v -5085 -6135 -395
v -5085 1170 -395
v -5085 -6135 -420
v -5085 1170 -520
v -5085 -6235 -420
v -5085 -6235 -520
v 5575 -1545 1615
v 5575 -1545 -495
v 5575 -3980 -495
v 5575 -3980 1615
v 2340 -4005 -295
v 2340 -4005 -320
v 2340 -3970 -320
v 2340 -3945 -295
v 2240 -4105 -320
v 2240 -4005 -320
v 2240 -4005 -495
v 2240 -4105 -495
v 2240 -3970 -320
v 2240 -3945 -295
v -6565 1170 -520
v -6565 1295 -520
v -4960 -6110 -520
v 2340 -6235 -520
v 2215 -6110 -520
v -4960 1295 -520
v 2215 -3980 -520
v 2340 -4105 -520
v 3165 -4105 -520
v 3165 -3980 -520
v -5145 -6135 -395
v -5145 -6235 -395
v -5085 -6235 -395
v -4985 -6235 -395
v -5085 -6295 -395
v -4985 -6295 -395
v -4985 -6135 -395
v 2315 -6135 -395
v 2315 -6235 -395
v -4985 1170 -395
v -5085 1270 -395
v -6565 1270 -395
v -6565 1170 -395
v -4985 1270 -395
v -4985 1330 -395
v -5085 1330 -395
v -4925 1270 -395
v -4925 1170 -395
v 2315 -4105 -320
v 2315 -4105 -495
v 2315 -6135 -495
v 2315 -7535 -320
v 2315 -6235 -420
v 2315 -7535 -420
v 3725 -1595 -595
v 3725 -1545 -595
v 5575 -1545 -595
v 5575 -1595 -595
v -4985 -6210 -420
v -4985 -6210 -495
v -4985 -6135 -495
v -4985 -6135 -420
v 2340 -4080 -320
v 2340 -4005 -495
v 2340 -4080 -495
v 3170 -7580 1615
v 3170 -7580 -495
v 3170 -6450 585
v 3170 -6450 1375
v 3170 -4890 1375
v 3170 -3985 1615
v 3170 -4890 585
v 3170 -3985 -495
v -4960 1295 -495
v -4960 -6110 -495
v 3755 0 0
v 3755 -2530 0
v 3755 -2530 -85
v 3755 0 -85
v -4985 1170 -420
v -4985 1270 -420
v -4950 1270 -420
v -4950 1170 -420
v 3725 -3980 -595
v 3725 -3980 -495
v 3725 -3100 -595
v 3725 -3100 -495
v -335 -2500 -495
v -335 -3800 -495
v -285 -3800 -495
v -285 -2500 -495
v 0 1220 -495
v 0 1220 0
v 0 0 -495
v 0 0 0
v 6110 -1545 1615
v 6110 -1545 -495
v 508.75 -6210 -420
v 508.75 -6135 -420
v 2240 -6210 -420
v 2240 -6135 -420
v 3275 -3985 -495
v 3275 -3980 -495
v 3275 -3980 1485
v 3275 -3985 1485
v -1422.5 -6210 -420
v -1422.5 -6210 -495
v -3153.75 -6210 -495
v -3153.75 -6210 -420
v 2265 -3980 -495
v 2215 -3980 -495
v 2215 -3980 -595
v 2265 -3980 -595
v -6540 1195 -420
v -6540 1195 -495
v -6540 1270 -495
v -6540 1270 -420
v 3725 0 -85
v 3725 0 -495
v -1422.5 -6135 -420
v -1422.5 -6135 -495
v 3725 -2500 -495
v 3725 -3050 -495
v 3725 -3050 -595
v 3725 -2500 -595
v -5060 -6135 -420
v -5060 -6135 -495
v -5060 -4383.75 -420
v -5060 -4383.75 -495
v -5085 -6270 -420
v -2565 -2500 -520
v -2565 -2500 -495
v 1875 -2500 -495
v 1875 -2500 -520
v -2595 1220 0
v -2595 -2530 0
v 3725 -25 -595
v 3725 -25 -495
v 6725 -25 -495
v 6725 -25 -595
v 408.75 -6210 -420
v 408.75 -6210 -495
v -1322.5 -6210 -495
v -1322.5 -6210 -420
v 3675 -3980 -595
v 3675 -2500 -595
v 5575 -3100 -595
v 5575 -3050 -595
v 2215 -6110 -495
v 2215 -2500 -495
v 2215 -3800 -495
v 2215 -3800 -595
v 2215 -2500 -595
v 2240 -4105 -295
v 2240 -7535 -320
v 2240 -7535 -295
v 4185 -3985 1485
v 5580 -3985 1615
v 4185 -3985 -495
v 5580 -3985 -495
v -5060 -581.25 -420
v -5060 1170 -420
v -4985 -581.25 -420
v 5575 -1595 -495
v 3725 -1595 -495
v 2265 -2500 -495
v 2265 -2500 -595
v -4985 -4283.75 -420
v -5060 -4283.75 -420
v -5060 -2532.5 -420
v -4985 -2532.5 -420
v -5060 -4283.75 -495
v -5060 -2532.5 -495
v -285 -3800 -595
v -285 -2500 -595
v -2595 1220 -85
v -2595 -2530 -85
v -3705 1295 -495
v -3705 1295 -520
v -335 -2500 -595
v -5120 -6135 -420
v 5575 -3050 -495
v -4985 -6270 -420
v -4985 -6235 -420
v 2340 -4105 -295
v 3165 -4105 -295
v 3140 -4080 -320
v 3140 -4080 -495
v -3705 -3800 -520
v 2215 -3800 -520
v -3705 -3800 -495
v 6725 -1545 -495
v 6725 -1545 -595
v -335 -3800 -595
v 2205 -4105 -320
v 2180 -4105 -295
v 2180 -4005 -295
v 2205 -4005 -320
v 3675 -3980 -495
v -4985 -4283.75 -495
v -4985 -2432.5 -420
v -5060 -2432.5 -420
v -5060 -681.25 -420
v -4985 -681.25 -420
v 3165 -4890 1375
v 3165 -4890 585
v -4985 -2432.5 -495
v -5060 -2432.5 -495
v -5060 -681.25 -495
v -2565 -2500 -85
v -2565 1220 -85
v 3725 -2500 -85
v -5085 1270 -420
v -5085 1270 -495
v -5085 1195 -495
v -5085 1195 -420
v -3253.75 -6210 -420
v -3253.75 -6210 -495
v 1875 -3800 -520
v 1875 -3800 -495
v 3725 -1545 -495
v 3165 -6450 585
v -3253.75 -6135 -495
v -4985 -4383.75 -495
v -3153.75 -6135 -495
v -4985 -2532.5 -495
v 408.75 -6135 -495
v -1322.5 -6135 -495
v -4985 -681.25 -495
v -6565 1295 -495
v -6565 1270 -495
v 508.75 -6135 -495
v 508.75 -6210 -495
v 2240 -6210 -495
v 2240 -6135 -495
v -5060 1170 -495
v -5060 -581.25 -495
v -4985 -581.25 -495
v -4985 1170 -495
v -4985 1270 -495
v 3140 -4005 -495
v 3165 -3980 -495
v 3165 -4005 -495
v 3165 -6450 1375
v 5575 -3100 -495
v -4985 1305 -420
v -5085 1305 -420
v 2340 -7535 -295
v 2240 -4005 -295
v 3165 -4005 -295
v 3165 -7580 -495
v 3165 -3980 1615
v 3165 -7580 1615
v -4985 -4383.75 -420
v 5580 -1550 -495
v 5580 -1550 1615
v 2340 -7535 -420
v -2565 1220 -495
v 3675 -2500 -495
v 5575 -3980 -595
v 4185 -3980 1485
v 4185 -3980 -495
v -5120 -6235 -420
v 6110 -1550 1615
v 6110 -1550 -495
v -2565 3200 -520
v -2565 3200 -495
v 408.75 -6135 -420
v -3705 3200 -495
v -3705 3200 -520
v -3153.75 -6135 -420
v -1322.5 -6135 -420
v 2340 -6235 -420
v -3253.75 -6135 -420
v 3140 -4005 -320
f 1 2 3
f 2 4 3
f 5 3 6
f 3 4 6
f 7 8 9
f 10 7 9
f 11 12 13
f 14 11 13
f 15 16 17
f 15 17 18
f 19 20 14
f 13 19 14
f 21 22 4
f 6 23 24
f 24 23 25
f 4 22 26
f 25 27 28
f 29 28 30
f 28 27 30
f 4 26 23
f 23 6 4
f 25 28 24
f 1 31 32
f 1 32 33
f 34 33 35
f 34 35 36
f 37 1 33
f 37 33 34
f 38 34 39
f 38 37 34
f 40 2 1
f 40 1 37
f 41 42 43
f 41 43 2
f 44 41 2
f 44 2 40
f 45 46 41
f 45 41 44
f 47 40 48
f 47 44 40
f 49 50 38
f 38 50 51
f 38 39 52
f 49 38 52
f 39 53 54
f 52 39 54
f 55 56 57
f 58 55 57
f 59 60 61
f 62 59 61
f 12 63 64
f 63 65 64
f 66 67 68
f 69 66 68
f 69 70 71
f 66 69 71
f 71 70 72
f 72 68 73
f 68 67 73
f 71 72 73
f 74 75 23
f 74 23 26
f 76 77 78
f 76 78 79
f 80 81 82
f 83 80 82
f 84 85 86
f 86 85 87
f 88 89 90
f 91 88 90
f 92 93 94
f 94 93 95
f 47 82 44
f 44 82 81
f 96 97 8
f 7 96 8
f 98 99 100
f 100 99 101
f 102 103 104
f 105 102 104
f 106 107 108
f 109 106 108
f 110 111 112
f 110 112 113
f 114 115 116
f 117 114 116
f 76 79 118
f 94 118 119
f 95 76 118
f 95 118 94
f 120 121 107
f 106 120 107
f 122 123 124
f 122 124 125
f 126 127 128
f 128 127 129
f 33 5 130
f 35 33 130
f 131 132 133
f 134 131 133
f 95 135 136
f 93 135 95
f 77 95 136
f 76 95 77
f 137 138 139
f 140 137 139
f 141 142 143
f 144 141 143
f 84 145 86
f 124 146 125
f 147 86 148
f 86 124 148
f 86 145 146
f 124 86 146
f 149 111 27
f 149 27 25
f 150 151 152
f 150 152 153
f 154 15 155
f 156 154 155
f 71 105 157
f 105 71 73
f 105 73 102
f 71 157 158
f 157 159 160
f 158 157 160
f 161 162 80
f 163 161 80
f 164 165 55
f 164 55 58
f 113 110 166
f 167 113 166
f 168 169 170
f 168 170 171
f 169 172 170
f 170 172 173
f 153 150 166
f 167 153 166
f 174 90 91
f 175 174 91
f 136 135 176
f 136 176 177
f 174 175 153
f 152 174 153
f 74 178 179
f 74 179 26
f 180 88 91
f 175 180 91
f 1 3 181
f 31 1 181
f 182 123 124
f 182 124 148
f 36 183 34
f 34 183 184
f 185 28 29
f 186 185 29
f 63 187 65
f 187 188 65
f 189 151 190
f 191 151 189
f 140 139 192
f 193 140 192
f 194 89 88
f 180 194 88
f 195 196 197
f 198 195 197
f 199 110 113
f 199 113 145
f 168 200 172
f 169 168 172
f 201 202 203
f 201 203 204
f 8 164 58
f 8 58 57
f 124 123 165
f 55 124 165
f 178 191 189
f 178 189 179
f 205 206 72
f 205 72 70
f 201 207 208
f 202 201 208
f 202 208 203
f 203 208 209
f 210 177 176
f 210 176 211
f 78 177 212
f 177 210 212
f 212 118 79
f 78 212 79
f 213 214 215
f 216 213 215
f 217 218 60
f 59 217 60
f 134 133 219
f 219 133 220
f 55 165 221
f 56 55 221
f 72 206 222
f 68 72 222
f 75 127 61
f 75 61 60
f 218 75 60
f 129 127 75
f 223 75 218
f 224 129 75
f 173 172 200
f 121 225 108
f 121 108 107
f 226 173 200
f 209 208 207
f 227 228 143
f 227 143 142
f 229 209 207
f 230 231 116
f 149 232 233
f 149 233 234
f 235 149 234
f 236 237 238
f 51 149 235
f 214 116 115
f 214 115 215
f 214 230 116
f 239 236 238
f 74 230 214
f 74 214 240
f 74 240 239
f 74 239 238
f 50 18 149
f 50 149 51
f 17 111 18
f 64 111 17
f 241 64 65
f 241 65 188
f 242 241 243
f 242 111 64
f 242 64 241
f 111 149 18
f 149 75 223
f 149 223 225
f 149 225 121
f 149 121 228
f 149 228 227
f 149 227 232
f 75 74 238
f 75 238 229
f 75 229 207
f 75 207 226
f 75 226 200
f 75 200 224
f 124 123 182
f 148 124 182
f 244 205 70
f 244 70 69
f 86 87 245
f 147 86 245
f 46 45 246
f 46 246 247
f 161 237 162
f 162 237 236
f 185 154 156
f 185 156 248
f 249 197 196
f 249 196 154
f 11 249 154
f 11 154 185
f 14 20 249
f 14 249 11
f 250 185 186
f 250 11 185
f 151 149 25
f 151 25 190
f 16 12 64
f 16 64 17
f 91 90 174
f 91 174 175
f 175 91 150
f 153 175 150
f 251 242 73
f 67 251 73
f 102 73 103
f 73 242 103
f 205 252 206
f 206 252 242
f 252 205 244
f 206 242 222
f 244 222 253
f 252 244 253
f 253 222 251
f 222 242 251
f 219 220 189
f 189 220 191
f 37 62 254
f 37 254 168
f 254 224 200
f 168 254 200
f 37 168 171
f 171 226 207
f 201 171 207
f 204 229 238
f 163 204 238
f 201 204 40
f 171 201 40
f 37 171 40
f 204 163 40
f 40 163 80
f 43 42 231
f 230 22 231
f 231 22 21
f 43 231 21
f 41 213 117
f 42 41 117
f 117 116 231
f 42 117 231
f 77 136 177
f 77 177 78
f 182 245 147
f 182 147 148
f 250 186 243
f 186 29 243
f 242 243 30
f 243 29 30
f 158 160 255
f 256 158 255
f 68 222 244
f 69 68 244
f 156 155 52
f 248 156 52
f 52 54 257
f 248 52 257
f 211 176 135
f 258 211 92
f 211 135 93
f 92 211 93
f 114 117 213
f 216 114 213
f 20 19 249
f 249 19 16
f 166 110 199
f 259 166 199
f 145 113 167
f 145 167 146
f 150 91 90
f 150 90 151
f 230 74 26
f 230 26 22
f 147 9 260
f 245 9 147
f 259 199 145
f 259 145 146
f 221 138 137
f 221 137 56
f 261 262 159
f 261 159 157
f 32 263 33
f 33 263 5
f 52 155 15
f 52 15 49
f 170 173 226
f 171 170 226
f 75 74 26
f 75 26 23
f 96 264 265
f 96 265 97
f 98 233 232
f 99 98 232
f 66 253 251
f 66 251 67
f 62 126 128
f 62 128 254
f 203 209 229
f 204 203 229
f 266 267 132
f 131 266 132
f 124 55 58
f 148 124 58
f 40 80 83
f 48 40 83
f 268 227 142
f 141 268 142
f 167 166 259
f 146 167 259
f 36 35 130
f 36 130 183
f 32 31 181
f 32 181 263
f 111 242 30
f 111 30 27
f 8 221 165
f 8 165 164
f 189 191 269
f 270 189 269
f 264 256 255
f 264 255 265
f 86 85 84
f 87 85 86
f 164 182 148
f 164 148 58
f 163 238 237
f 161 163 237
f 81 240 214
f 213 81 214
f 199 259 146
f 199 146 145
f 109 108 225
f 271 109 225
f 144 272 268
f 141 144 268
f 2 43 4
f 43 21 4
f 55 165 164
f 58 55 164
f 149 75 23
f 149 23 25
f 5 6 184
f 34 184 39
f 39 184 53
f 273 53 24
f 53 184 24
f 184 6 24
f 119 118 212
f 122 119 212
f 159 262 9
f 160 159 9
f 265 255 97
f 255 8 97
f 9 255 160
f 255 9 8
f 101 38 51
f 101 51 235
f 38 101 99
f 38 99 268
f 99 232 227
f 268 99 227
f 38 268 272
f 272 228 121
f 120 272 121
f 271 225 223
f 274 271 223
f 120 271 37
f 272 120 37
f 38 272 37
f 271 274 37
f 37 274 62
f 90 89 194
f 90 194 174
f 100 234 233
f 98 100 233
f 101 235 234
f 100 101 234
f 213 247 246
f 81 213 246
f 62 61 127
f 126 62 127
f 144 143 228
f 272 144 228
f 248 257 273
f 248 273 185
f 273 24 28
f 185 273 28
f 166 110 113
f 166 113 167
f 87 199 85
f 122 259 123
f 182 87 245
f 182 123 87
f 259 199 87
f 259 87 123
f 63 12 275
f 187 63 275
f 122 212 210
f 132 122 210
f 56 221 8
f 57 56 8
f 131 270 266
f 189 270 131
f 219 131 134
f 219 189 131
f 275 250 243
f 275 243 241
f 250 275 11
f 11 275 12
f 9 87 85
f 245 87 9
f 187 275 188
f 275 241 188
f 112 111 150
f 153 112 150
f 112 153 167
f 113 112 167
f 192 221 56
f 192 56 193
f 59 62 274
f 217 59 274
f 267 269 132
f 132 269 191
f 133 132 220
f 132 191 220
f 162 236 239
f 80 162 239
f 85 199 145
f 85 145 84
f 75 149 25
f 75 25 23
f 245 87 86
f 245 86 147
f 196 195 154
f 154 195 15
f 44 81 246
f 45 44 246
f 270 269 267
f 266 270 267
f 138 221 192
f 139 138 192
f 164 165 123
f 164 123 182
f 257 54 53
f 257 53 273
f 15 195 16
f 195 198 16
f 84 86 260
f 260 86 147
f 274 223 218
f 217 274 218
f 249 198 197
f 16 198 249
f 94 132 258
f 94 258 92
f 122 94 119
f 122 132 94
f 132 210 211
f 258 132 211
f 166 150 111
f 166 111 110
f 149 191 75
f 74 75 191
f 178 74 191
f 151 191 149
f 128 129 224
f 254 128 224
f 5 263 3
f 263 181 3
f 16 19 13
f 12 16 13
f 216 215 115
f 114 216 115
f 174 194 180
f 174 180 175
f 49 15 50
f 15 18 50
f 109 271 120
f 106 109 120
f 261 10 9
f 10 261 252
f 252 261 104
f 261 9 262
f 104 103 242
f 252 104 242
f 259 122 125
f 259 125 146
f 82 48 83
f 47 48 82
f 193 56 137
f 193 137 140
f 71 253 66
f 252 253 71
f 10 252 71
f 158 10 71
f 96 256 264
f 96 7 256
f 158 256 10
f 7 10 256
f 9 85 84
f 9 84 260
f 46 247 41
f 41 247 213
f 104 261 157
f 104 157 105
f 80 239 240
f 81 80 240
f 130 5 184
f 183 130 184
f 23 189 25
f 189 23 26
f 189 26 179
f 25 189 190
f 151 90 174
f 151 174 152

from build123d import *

# Parameters (mm, degrees)
F1_DEPTH  = 85
F3_DEPTH  = 410
F5_DEPTH  = 25
F7_DEPTH  = 25
F9_DEPTH  = 75
F10_W     = 25
F10_H     = 1300
F11_DEPTH = 100
F12_W     = 800
F12_H     = 75
F12_W_2   = 100
F12_H_2   = 60
F12_W_3   = 75
F12_H_3   = 3430
F12_W_4   = 60
F12_H_4   = 100
F13_DEPTH = 25
F15_DEPTH = 25
F16_SIZE  = 24.99999
F18_DEPTH = 25
F20_DEPTH = 2110
F21_W     = 3000
F21_H     = 1520
F22_DEPTH = 100
F23_W     = 50
F23_H     = 1480
F24_DEPTH = 100
F23_W_2   = 1850
F23_H_2   = 50
F23_H_3   = 1300
F25_W     = 1850
F25_H     = 1455
F26_DEPTH = 100
F25_H_2   = 880
F25_W_2   = 1410
F25_H_3   = 1480
F25_W_3   = 2500
F25_H_4   = 1300
F27_W     = 910
F27_H     = 1980
F28_DEPTH = 5
F29_W     = 1560
F29_H     = 790
F30_DEPTH = 5


# Not quite as in the source:
# - a fillet or chamfer is up to 0.001 mm smaller than in the source, because OpenCascade refuses the exact size


with BuildPart() as f1:
    # F0 (on Top) → F1 (new body)
    with BuildSketch(Plane.XY):
        Polygon((3755, 0), (0, 0), (0, 1220), (-2595, 1220), (-2595, -2530), (3755, -2530), align=None)
    extrude(amount=-F1_DEPTH)

    # F2 (on face) → F3 (join)
    with BuildSketch(Plane(origin=(0, 0, -85), x_dir=(1, 0, 0), z_dir=(0, 0, -1))):
        Polygon((-2565, 2500), (-2565, -1220), (0, -1220), (0, 0), (3725, 0), (3725, 2500), align=None)
    extrude(amount=F3_DEPTH)


with BuildPart() as f5:
    # F4 (on face) → F5 (new body)
    with BuildSketch(Plane(origin=(0, 0, -495), x_dir=(1, 0, 0), z_dir=(0, 0, -1))):
        Polygon((-2565, -3200), (-2565, 2500), (1875, 2500), (1875, 3800), (-3705, 3800), (-3705, -3200), align=None)
    extrude(amount=F5_DEPTH)


with BuildPart() as f7:
    # F6 (on face) → F7 (new body)
    with BuildSketch(Plane.XY.offset(-495)):
        Polygon((3165, -3980), (2215, -3980), (2215, -6110), (-4960, -6110), (-4960, 1295), (-6565, 1295), (-6565, 1170), (-5085, 1170), (-5085, -6235), (2340, -6235), (2340, -4105), (3165, -4105), align=None)
    extrude(amount=-F7_DEPTH)

    # F8 (on face) → F9 (join)
    with BuildSketch(Plane.XY.offset(-495)):
        Polygon((3165, -4005), (3140, -4005), (3140, -4080), (2340, -4080), (2340, -4005), (2240, -4005), (2240, -4105), (2315, -4105), (2315, -6135), (2240, -6135), (2240, -6210), (508.75, -6210), (508.75, -6135), (408.75, -6135), (408.75, -6210), (-1322.5, -6210), (-1322.5, -6135), (-1422.5, -6135), (-1422.5, -6210), (-3153.75, -6210), (-3153.75, -6135), (-3253.75, -6135), (-3253.75, -6210), (-4985, -6210), (-4985, -6135), (-5060, -6135), (-5060, -4383.75), (-4985, -4383.75), (-4985, -4283.75), (-5060, -4283.75), (-5060, -2532.5), (-4985, -2532.5), (-4985, -2432.5), (-5060, -2432.5), (-5060, -681.25), (-4985, -681.25), (-4985, -581.25), (-5060, -581.25), (-5060, 1170), (-4985, 1170), (-4985, 1270), (-5085, 1270), (-5085, 1195), (-6540, 1195), (-6540, 1270), (-6565, 1270), (-6565, 1170), (-5085, 1170), (-5085, -6235), (2340, -6235), (2340, -4105), (3165, -4105), align=None)
    extrude(amount=F9_DEPTH)

    # F10 (on face) → F11 (join)
    with BuildSketch(Plane.XY.offset(-420)):
        Polygon((3165, -4105), (3165, -4005), (3140, -4005), (3140, -4080), (2340, -4080), (2340, -4005), (2240, -4005), (2240, -4105), (2315, -4105), (2315, -6135), (2315, -6235), (2340, -6235), (2340, -4105), align=None)
        with Locations((2327.5, -6885)):
            Rectangle(F10_W, F10_H)
    extrude(amount=F11_DEPTH)

    # F12 (on face) → F13 (join)
    with BuildSketch(Plane.XY.offset(-320)):
        Polygon((2340, -4105), (3165, -4105), (3165, -4005), (3140, -4005), (3140, -4080), (2340, -4080), (2340, -4005), (2240, -4005), (2240, -4105), (2315, -4105), (2315, -7535), (2340, -7535), align=None)
        with Locations((2740, -4042.5)):
            Rectangle(F12_W, F12_H)
        with Locations((2290, -3975)):
            Rectangle(F12_W_2, F12_H_2)
        with Locations((2277.5, -5820)):
            Rectangle(F12_W_3, F12_H_3)
        with Locations((2210, -4055)):
            Rectangle(F12_W_4, F12_H_4)
    extrude(amount=F13_DEPTH)

    # F14 (on face) → F15 (join)
    with BuildSketch(Plane.XY.offset(-420)):
        Polygon((2315, -6235), (2315, -6135), (-4985, -6135), (-4985, 1170), (-4925, 1170), (-4925, 1270), (-4985, 1270), (-4985, 1330), (-5085, 1330), (-5085, 1270), (-6565, 1270), (-6565, 1170), (-5085, 1170), (-5085, -6135), (-5145, -6135), (-5145, -6235), (-5085, -6235), (-5085, -6295), (-4985, -6295), (-4985, -6235), align=None)
    extrude(amount=F15_DEPTH)

    # F16 (size 25 in the source; OpenCascade refuses exactly that, so slightly less here)
    f16_edges = [f7.edges().sort_by_distance(p)[0] for p in [
        (2180, -4055, -320),
        (2290, -3945, -320),
        (-5035, -6295, -420),
        (-5145, -6185, -420),
        (-5035, 1330, -420),
        (-4925, 1220, -420),
    ]]
    chamfer(f16_edges, length=F16_SIZE)


with BuildPart() as f18:
    # F17 (on face) → F18 (new body)
    with BuildSketch(Plane.XY.offset(-495)):
        Polygon((-3705, -3800), (-3705, 1295), (-4960, 1295), (-4960, -6110), (2215, -6110), (2215, -3800), (1875, -3800), align=None)
    extrude(amount=-F18_DEPTH)


with BuildPart() as f20:
    # F19 (on face) → F20 (new body)
    with BuildSketch(Plane.XY.offset(-495)):
        Polygon((3165, -3980), (3165, -7580), (3170, -7580), (3170, -3985), (5580, -3985), (5580, -1550), (6110, -1550), (6110, -1545), (5575, -1545), (5575, -3980), align=None)
    extrude(amount=F20_DEPTH)

    # F27 (on face) → F28 (cut, through all)
    with BuildSketch(Plane(origin=(0, -3980, 0), x_dir=(-1, 0, 0), z_dir=(0, 1, 0))):
        with Locations((-3730, 495)):
            Rectangle(F27_W, F27_H)
    extrude(amount=-F28_DEPTH, mode=Mode.SUBTRACT)

    # F29 (on face) → F30 (cut, through all)
    with BuildSketch(Plane(origin=(3165, 0, 0), x_dir=(0, -1, 0), z_dir=(-1, 0, 0))):
        with Locations((5670, 980)):
            Rectangle(F29_W, F29_H)
    extrude(amount=-F30_DEPTH, mode=Mode.SUBTRACT)


with BuildPart() as f22:
    # F21 (on face) → F22 (new body)
    with BuildSketch(Plane(origin=(0, 0, -495), x_dir=(1, 0, 0), z_dir=(0, 0, -1))):
        with Locations((5225, 785)):
            Rectangle(F21_W, F21_H)
    extrude(amount=F22_DEPTH)


with BuildPart() as f24:
    # F23 (on face) → F24 (new body)
    with BuildSketch(Plane.XY.offset(-495)):
        with Locations((2240, -3240)):
            Rectangle(F23_W, F23_H)
    extrude(amount=-F24_DEPTH)


with BuildPart() as f24b:
    # F23 (on face) → F24, piece 2 (new body)
    with BuildSketch(Plane.XY.offset(-495)):
        with Locations((4650, -1570)):
            Rectangle(F23_W_2, F23_H_2)
    extrude(amount=-F24_DEPTH)


with BuildPart() as f24c:
    # F23 (on face) → F24, piece 3 (new body)
    with BuildSketch(Plane.XY.offset(-495)):
        Polygon((3725, -3050), (3725, -2500), (3675, -2500), (3675, -3980), (3725, -3980), (3725, -3100), align=None)
        with Locations((4650, -3075)):
            Rectangle(F23_W_2, F23_H_2)
    extrude(amount=-F24_DEPTH)


with BuildPart() as f24d:
    # F23 (on face) → F24, piece 4 (new body)
    with BuildSketch(Plane.XY.offset(-495)):
        with Locations((-310, -3150)):
            Rectangle(F23_W, F23_H_3)
    extrude(amount=-F24_DEPTH)


with BuildPart() as f26:
    # F25 (on face) → F26 (new body)
    with BuildSketch(Plane.XY.offset(-495)):
        with Locations((4650, -2322.5)):
            Rectangle(F25_W, F25_H)
    extrude(amount=-F26_DEPTH)


with BuildPart() as f26b:
    # F25 (on face) → F26, piece 2 (new body)
    with BuildSketch(Plane.XY.offset(-495)):
        with Locations((4650, -3540)):
            Rectangle(F25_W, F25_H_2)
    extrude(amount=-F26_DEPTH)


with BuildPart() as f26c:
    # F25 (on face) → F26, piece 3 (new body)
    with BuildSketch(Plane.XY.offset(-495)):
        with Locations((2970, -3240)):
            Rectangle(F25_W_2, F25_H_3)
    extrude(amount=-F26_DEPTH)


with BuildPart() as f26d:
    # F25 (on face) → F26, piece 4 (new body)
    with BuildSketch(Plane.XY.offset(-495)):
        with Locations((965, -3150)):
            Rectangle(F25_W_3, F25_H_4)
    extrude(amount=-F26_DEPTH)


solid = Compound([f1.part, f5.part, f7.part, f18.part, f20.part, f22.part, f24.part, f24b.part, f24c.part, f24d.part, f26.part, f26b.part, f26c.part, f26d.part])
